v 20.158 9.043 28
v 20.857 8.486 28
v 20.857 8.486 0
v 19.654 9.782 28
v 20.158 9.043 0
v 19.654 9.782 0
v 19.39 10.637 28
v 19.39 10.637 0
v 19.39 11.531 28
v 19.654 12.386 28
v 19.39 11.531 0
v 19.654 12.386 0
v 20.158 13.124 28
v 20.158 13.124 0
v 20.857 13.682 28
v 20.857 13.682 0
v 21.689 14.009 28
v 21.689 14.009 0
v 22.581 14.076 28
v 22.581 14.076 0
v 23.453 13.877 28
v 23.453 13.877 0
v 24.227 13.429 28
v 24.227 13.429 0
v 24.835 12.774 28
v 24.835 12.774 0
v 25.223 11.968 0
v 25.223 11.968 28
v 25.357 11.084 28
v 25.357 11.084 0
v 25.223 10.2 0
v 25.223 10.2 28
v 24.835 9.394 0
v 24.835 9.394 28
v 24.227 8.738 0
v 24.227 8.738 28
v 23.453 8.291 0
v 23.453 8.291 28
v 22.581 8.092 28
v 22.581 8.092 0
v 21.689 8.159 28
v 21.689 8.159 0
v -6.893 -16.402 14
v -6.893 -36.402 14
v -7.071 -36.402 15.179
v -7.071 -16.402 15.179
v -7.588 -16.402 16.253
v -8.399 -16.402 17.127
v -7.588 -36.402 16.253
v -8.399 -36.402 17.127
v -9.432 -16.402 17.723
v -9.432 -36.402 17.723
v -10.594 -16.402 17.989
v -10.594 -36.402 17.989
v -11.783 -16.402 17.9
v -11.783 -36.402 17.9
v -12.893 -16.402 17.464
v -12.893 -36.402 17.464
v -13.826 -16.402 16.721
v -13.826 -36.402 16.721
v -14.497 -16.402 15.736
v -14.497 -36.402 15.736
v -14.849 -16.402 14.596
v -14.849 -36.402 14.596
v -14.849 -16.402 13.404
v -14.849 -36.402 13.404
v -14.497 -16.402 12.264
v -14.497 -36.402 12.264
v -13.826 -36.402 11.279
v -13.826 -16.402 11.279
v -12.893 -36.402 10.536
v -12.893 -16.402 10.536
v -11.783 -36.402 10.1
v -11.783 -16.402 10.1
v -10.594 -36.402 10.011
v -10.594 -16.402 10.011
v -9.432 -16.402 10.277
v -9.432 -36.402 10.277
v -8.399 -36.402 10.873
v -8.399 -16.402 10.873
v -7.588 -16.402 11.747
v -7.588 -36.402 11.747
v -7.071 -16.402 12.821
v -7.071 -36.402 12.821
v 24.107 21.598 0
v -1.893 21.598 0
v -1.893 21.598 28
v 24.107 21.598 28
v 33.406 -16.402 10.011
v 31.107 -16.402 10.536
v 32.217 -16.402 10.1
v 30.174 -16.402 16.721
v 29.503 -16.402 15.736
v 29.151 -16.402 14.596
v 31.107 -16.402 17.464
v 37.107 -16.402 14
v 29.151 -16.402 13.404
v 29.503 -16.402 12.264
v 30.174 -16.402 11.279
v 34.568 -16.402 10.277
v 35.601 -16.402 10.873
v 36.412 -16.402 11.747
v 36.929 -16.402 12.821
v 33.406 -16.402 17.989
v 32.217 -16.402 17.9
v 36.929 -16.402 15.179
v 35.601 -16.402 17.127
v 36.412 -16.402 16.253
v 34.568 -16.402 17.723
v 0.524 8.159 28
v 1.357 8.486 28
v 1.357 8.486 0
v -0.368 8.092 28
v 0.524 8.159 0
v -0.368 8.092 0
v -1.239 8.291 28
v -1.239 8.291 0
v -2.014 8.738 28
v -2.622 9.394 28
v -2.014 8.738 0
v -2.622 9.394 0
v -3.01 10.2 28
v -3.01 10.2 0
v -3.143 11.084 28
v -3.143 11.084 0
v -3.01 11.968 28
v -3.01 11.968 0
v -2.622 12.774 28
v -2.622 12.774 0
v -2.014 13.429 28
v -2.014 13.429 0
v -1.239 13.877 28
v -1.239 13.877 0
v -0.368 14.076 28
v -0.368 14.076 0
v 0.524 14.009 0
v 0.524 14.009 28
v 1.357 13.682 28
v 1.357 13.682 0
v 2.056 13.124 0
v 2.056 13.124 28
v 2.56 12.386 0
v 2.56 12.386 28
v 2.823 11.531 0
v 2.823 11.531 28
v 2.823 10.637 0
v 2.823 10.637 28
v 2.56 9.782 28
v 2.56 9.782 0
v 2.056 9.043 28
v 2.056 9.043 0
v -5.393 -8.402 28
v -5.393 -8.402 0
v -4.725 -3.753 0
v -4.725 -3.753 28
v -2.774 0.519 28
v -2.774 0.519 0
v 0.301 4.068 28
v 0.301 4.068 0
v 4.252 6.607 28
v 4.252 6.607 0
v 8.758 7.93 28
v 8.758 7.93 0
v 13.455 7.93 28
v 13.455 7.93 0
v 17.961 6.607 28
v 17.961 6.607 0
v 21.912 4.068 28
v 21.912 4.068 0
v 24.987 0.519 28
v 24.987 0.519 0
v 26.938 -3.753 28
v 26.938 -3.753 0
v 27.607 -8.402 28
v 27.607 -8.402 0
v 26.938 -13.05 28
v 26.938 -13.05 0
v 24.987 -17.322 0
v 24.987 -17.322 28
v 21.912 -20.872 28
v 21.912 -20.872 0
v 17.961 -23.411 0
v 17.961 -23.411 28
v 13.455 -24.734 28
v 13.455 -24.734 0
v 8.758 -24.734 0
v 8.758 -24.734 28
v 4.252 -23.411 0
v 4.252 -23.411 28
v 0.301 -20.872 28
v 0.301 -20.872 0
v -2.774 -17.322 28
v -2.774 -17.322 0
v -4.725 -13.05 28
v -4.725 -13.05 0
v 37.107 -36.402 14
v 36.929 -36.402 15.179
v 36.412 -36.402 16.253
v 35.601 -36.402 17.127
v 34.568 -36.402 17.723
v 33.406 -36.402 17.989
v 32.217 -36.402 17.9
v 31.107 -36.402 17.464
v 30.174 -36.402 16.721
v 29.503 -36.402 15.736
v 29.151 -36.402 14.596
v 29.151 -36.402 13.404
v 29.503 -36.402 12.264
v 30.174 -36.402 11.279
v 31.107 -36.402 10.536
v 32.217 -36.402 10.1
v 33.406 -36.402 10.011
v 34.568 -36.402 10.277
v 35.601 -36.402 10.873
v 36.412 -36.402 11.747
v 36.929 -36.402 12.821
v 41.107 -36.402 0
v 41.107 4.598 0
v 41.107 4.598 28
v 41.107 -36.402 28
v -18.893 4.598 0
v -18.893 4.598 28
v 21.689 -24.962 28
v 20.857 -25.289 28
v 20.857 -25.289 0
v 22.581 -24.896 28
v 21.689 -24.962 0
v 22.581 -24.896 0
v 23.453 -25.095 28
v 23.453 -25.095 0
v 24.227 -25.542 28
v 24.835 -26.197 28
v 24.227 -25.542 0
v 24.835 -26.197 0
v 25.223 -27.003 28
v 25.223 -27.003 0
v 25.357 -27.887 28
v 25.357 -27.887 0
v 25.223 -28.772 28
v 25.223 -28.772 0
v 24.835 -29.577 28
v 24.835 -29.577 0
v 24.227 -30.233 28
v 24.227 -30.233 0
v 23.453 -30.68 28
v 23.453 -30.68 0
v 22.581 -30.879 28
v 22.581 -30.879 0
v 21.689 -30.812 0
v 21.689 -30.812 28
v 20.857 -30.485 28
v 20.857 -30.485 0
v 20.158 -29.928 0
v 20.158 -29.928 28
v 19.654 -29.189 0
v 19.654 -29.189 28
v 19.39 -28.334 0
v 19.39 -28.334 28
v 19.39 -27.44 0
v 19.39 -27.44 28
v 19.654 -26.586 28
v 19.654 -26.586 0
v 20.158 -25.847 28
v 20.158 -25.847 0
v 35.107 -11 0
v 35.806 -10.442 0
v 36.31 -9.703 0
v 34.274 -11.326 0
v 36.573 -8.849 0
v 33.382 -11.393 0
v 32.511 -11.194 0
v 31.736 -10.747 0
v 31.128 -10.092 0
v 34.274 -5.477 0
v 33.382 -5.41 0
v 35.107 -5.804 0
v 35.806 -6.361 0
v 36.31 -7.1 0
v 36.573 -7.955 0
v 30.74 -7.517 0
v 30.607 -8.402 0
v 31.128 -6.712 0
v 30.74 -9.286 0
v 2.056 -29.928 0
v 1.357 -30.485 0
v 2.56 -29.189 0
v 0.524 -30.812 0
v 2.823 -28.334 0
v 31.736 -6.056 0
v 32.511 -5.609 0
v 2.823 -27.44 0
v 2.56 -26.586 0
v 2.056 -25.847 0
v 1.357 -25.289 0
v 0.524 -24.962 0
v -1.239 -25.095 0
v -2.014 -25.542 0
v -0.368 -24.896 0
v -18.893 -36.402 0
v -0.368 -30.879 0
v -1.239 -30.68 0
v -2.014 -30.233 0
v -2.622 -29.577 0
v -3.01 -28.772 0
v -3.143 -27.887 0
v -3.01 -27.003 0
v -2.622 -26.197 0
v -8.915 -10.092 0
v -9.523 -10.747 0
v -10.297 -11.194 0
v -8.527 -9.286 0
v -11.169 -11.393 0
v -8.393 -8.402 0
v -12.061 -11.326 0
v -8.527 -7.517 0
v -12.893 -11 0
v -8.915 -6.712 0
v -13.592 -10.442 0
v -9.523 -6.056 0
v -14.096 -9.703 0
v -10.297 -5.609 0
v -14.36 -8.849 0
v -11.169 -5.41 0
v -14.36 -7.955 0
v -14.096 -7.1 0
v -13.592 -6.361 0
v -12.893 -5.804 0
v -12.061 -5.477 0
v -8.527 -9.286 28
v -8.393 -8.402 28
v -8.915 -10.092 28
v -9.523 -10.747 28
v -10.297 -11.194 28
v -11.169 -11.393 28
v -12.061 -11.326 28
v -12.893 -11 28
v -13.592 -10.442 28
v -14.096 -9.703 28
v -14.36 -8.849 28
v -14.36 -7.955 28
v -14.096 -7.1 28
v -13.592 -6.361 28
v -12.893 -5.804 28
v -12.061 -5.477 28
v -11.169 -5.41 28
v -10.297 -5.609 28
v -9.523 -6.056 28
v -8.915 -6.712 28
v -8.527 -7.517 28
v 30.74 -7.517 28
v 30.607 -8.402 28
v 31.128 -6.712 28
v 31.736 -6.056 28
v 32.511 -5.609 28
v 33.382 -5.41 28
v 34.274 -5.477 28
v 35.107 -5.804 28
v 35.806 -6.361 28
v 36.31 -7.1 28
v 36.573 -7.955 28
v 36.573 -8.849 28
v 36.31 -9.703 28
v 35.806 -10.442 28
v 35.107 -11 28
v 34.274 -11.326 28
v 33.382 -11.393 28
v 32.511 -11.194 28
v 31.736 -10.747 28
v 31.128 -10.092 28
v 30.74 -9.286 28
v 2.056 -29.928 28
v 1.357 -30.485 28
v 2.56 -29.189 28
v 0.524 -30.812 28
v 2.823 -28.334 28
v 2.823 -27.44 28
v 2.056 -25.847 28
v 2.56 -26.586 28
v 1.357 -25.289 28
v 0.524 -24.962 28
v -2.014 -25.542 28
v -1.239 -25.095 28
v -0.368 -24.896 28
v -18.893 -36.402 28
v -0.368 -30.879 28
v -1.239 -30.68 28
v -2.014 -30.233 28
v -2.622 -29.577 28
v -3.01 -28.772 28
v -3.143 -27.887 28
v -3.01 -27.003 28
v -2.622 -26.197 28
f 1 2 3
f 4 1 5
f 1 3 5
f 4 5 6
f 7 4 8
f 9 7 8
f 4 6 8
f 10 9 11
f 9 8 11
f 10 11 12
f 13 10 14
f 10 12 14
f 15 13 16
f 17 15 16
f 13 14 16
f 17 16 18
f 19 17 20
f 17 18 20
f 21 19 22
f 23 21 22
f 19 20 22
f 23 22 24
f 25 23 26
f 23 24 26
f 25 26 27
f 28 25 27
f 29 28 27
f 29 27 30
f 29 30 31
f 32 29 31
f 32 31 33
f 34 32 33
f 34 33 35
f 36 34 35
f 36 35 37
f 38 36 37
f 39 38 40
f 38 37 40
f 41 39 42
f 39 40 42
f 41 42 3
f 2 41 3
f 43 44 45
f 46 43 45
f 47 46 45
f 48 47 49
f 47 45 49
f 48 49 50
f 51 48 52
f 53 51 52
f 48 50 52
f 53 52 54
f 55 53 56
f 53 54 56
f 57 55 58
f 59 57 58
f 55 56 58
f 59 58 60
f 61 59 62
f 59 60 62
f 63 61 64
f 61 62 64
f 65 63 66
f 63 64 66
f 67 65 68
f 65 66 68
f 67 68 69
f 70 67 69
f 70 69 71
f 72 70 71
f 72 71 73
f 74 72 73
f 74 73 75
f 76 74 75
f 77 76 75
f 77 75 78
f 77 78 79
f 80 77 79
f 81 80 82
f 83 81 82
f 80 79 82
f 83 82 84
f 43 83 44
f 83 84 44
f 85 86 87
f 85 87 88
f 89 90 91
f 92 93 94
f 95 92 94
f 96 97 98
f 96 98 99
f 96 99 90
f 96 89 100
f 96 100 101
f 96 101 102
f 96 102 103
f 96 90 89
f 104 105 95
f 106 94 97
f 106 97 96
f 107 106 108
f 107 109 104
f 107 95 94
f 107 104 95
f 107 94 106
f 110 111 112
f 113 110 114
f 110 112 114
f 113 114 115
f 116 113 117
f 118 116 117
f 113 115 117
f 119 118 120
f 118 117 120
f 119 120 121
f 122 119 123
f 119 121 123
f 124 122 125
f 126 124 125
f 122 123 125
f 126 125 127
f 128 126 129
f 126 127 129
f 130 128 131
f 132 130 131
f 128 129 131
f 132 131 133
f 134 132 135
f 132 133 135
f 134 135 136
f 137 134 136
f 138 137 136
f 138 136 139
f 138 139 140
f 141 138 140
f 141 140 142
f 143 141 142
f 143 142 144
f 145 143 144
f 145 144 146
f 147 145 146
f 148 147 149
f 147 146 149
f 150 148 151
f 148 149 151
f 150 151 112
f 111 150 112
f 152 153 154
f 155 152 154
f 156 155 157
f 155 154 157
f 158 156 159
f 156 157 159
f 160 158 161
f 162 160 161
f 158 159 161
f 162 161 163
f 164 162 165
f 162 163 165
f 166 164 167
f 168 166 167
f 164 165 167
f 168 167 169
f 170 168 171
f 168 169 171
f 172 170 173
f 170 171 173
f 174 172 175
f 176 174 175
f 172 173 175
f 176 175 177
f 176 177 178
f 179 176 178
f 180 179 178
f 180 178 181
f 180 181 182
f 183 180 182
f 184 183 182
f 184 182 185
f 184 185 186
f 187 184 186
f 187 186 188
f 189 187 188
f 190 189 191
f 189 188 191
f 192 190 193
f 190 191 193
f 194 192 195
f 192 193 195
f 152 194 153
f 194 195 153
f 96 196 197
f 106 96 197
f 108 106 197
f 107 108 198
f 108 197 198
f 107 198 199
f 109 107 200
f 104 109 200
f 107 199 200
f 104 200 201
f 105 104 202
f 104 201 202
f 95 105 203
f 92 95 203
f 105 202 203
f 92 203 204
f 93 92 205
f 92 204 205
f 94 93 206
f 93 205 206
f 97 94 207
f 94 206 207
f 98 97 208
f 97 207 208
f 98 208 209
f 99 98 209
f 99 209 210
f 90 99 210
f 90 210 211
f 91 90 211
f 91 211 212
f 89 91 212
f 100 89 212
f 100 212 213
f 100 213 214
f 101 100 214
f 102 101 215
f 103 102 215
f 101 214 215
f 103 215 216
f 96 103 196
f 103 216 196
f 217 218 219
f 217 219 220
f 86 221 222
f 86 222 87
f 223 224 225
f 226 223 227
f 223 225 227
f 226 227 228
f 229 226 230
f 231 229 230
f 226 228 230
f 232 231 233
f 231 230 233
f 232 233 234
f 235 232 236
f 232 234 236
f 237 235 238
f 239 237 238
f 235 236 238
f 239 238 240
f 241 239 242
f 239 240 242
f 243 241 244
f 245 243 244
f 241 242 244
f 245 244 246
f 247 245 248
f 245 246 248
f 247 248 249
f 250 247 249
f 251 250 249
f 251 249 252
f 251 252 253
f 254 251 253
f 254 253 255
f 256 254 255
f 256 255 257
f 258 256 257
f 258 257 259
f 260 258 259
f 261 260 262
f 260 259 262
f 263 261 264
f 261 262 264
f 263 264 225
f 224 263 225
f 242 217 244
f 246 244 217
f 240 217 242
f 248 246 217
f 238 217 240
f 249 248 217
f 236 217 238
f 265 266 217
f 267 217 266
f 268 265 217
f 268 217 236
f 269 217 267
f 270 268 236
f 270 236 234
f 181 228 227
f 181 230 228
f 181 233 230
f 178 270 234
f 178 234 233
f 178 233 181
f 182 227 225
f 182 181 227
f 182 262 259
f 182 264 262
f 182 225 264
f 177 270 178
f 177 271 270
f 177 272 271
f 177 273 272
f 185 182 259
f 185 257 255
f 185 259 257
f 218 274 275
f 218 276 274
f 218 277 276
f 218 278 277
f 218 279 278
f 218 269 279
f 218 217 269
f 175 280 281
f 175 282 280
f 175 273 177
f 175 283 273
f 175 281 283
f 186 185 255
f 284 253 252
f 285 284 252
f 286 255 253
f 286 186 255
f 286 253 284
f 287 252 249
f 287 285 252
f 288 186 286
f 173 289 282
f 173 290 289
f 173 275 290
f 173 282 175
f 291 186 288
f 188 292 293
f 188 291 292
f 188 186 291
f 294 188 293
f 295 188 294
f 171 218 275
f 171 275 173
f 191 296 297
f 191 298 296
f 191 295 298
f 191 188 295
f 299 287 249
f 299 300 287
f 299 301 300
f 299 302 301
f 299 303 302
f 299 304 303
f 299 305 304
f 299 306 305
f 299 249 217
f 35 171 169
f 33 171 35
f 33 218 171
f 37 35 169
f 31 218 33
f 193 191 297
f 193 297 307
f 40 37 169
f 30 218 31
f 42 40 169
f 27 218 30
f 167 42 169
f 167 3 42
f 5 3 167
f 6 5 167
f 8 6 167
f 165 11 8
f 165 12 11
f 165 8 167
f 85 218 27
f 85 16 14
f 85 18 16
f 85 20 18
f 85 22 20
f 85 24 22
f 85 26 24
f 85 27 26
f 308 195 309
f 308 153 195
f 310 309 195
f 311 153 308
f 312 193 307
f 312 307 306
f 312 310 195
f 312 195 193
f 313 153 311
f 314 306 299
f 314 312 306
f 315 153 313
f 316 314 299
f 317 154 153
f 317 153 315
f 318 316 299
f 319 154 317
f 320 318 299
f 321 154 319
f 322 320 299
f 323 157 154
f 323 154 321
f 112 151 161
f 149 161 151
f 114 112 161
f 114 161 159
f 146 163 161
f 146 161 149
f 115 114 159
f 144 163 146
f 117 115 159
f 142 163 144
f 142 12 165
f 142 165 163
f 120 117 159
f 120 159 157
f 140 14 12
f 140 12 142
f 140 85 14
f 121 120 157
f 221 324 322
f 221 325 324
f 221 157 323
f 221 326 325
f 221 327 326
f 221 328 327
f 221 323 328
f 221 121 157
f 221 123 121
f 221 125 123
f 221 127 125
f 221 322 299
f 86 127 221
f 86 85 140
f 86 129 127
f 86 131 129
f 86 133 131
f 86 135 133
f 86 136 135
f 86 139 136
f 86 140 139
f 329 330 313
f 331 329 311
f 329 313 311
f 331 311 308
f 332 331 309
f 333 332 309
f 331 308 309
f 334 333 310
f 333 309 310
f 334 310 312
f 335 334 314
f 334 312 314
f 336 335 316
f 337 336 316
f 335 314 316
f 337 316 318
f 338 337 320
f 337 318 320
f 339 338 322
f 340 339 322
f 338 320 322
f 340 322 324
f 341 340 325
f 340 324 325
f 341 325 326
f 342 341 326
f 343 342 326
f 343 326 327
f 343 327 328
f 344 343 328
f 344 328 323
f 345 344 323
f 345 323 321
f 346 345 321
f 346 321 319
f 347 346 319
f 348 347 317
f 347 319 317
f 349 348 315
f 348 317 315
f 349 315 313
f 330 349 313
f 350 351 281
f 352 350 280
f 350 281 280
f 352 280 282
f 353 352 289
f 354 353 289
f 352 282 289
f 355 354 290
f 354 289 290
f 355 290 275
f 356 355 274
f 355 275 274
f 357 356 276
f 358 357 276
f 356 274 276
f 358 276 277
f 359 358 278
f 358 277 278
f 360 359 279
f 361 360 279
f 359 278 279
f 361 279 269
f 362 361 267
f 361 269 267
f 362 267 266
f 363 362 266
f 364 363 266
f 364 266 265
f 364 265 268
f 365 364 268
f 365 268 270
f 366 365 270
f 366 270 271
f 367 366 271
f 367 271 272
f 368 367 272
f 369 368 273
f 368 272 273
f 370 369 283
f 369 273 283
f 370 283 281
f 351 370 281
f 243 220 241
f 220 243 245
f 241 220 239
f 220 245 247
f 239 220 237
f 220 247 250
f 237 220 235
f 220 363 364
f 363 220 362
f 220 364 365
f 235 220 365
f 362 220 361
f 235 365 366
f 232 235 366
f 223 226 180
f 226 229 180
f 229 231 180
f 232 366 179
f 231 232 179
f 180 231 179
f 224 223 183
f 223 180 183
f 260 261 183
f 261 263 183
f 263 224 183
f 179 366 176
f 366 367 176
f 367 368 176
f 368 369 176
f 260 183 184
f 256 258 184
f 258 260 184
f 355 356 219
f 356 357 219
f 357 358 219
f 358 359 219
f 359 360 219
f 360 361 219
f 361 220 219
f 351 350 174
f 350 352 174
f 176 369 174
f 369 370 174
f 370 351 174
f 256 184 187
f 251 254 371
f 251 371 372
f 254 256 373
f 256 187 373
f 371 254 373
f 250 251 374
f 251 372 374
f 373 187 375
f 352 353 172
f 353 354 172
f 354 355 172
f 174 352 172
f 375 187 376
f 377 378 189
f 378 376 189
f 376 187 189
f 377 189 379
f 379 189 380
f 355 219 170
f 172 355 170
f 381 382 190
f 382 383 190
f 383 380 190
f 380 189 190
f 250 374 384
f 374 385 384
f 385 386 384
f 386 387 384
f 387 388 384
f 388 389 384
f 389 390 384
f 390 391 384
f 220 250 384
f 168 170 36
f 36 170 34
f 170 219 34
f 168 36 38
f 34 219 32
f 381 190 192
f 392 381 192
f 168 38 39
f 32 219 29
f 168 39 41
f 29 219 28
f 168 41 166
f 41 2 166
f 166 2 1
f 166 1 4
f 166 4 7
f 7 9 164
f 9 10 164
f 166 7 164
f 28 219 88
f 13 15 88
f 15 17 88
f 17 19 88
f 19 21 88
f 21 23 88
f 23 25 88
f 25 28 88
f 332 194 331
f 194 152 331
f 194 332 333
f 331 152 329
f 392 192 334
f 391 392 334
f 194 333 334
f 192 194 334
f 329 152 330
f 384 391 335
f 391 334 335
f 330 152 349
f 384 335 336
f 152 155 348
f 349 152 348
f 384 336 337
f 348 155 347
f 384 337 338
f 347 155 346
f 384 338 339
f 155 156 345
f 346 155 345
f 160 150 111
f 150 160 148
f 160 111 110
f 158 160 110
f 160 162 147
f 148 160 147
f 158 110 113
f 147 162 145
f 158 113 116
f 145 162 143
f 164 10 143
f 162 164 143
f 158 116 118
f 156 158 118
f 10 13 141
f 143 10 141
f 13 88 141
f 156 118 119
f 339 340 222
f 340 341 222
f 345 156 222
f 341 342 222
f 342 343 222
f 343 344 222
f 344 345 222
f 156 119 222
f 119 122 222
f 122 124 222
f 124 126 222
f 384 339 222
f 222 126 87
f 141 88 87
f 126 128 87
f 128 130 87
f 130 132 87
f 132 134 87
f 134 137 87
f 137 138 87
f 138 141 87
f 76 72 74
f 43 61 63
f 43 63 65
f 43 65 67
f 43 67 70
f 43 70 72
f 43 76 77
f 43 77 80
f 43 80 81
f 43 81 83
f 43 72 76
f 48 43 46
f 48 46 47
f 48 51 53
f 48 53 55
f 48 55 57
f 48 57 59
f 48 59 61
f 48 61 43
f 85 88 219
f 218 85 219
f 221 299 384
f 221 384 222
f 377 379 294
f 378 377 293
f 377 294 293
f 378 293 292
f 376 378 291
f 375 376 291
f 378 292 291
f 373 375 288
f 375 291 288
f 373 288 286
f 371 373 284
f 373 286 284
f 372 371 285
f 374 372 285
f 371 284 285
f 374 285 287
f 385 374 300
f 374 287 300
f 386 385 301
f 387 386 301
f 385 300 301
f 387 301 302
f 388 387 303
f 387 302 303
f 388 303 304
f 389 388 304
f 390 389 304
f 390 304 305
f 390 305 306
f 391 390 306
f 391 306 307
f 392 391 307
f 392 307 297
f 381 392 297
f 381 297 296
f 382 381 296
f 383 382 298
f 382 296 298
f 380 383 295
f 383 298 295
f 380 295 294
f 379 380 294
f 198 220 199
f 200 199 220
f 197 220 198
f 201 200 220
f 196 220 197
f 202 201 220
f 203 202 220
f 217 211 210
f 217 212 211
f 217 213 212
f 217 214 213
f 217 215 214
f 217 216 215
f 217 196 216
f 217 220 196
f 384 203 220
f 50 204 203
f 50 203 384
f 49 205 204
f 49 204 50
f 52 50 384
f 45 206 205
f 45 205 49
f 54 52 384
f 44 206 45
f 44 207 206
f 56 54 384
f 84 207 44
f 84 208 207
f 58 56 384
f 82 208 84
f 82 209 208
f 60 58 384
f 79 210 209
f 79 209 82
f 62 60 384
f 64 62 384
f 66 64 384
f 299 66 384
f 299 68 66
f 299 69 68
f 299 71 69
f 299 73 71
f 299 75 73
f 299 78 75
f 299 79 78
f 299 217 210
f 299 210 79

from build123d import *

# Parameters (mm, degrees)
DODANIE_WYCI_GNI_CIE1_DEPTH = 28
SZKIC2_R                    = 16.5
WYTNIJ_WYCI_GNI_CIE1_DEPTH  = 28
SZKIC3_R                    = 3
WYTNIJ_WYCI_GNI_CIE2_DEPTH  = 28
SZYK_KO_OWY1_COUNT          = 6
SZKIC4_R                    = 4
WYTNIJ_WYCI_GNI_CIE3_DEPTH  = 20


with BuildPart() as part:
    # Szkic1 → Dodanie-wyciągnięcie1 (new body)
    with BuildSketch(Plane.XY):
        Polygon((-18.893335163, -36.401668679), (-18.893335163, 4.598331321), (-1.893335163, 21.598331321), (24.106664837, 21.598331321), (41.106664837, 4.598331321), (41.106664837, -36.401668679), align=None)
    extrude(amount=DODANIE_WYCI_GNI_CIE1_DEPTH)

    # Szkic2 → Wytnij-wyciągnięcie1 (cut)
    with BuildSketch(Plane(origin=(0, 0, 0), x_dir=(-1, 0, 0), z_dir=(0, 0, -1))):
        with Locations((-11.106664837, -8.401668679)):
            Circle(SZKIC2_R)
    extrude(amount=-WYTNIJ_WYCI_GNI_CIE1_DEPTH, mode=Mode.SUBTRACT)

    # Szkic3 → Wytnij-wyciągnięcie2 (cut)
    with BuildSketch(Plane(origin=(0, 0, 0), x_dir=(-1, 0, 0), z_dir=(0, 0, -1))):
        with Locations((-33.606664837, -8.401668679)):
            Circle(SZKIC3_R)
    wytnij_wyci_gni_cie2 = extrude(amount=-WYTNIJ_WYCI_GNI_CIE2_DEPTH, mode=Mode.SUBTRACT)

    # Szyk kołowy1: Wytnij-wyciągnięcie2 ×6 about axis
    szyk_ko_owy1_axis = Axis((11.106664837, -8.401668679, 0), (0, 0, 1))
    for i in range(1, SZYK_KO_OWY1_COUNT):
        add(wytnij_wyci_gni_cie2.rotate(szyk_ko_owy1_axis, i * 360 / SZYK_KO_OWY1_COUNT), mode=Mode.SUBTRACT)

    # Szkic4 → Wytnij-wyciągnięcie3 (cut)
    with BuildSketch(Plane.XZ.offset(36.401668679)):
        with Locations((-10.893335163, 14)):
            Circle(SZKIC4_R)
        with Locations((33.106664837, 14)):
            Circle(SZKIC4_R)
    extrude(amount=-WYTNIJ_WYCI_GNI_CIE3_DEPTH, mode=Mode.SUBTRACT)


solid = part.part
